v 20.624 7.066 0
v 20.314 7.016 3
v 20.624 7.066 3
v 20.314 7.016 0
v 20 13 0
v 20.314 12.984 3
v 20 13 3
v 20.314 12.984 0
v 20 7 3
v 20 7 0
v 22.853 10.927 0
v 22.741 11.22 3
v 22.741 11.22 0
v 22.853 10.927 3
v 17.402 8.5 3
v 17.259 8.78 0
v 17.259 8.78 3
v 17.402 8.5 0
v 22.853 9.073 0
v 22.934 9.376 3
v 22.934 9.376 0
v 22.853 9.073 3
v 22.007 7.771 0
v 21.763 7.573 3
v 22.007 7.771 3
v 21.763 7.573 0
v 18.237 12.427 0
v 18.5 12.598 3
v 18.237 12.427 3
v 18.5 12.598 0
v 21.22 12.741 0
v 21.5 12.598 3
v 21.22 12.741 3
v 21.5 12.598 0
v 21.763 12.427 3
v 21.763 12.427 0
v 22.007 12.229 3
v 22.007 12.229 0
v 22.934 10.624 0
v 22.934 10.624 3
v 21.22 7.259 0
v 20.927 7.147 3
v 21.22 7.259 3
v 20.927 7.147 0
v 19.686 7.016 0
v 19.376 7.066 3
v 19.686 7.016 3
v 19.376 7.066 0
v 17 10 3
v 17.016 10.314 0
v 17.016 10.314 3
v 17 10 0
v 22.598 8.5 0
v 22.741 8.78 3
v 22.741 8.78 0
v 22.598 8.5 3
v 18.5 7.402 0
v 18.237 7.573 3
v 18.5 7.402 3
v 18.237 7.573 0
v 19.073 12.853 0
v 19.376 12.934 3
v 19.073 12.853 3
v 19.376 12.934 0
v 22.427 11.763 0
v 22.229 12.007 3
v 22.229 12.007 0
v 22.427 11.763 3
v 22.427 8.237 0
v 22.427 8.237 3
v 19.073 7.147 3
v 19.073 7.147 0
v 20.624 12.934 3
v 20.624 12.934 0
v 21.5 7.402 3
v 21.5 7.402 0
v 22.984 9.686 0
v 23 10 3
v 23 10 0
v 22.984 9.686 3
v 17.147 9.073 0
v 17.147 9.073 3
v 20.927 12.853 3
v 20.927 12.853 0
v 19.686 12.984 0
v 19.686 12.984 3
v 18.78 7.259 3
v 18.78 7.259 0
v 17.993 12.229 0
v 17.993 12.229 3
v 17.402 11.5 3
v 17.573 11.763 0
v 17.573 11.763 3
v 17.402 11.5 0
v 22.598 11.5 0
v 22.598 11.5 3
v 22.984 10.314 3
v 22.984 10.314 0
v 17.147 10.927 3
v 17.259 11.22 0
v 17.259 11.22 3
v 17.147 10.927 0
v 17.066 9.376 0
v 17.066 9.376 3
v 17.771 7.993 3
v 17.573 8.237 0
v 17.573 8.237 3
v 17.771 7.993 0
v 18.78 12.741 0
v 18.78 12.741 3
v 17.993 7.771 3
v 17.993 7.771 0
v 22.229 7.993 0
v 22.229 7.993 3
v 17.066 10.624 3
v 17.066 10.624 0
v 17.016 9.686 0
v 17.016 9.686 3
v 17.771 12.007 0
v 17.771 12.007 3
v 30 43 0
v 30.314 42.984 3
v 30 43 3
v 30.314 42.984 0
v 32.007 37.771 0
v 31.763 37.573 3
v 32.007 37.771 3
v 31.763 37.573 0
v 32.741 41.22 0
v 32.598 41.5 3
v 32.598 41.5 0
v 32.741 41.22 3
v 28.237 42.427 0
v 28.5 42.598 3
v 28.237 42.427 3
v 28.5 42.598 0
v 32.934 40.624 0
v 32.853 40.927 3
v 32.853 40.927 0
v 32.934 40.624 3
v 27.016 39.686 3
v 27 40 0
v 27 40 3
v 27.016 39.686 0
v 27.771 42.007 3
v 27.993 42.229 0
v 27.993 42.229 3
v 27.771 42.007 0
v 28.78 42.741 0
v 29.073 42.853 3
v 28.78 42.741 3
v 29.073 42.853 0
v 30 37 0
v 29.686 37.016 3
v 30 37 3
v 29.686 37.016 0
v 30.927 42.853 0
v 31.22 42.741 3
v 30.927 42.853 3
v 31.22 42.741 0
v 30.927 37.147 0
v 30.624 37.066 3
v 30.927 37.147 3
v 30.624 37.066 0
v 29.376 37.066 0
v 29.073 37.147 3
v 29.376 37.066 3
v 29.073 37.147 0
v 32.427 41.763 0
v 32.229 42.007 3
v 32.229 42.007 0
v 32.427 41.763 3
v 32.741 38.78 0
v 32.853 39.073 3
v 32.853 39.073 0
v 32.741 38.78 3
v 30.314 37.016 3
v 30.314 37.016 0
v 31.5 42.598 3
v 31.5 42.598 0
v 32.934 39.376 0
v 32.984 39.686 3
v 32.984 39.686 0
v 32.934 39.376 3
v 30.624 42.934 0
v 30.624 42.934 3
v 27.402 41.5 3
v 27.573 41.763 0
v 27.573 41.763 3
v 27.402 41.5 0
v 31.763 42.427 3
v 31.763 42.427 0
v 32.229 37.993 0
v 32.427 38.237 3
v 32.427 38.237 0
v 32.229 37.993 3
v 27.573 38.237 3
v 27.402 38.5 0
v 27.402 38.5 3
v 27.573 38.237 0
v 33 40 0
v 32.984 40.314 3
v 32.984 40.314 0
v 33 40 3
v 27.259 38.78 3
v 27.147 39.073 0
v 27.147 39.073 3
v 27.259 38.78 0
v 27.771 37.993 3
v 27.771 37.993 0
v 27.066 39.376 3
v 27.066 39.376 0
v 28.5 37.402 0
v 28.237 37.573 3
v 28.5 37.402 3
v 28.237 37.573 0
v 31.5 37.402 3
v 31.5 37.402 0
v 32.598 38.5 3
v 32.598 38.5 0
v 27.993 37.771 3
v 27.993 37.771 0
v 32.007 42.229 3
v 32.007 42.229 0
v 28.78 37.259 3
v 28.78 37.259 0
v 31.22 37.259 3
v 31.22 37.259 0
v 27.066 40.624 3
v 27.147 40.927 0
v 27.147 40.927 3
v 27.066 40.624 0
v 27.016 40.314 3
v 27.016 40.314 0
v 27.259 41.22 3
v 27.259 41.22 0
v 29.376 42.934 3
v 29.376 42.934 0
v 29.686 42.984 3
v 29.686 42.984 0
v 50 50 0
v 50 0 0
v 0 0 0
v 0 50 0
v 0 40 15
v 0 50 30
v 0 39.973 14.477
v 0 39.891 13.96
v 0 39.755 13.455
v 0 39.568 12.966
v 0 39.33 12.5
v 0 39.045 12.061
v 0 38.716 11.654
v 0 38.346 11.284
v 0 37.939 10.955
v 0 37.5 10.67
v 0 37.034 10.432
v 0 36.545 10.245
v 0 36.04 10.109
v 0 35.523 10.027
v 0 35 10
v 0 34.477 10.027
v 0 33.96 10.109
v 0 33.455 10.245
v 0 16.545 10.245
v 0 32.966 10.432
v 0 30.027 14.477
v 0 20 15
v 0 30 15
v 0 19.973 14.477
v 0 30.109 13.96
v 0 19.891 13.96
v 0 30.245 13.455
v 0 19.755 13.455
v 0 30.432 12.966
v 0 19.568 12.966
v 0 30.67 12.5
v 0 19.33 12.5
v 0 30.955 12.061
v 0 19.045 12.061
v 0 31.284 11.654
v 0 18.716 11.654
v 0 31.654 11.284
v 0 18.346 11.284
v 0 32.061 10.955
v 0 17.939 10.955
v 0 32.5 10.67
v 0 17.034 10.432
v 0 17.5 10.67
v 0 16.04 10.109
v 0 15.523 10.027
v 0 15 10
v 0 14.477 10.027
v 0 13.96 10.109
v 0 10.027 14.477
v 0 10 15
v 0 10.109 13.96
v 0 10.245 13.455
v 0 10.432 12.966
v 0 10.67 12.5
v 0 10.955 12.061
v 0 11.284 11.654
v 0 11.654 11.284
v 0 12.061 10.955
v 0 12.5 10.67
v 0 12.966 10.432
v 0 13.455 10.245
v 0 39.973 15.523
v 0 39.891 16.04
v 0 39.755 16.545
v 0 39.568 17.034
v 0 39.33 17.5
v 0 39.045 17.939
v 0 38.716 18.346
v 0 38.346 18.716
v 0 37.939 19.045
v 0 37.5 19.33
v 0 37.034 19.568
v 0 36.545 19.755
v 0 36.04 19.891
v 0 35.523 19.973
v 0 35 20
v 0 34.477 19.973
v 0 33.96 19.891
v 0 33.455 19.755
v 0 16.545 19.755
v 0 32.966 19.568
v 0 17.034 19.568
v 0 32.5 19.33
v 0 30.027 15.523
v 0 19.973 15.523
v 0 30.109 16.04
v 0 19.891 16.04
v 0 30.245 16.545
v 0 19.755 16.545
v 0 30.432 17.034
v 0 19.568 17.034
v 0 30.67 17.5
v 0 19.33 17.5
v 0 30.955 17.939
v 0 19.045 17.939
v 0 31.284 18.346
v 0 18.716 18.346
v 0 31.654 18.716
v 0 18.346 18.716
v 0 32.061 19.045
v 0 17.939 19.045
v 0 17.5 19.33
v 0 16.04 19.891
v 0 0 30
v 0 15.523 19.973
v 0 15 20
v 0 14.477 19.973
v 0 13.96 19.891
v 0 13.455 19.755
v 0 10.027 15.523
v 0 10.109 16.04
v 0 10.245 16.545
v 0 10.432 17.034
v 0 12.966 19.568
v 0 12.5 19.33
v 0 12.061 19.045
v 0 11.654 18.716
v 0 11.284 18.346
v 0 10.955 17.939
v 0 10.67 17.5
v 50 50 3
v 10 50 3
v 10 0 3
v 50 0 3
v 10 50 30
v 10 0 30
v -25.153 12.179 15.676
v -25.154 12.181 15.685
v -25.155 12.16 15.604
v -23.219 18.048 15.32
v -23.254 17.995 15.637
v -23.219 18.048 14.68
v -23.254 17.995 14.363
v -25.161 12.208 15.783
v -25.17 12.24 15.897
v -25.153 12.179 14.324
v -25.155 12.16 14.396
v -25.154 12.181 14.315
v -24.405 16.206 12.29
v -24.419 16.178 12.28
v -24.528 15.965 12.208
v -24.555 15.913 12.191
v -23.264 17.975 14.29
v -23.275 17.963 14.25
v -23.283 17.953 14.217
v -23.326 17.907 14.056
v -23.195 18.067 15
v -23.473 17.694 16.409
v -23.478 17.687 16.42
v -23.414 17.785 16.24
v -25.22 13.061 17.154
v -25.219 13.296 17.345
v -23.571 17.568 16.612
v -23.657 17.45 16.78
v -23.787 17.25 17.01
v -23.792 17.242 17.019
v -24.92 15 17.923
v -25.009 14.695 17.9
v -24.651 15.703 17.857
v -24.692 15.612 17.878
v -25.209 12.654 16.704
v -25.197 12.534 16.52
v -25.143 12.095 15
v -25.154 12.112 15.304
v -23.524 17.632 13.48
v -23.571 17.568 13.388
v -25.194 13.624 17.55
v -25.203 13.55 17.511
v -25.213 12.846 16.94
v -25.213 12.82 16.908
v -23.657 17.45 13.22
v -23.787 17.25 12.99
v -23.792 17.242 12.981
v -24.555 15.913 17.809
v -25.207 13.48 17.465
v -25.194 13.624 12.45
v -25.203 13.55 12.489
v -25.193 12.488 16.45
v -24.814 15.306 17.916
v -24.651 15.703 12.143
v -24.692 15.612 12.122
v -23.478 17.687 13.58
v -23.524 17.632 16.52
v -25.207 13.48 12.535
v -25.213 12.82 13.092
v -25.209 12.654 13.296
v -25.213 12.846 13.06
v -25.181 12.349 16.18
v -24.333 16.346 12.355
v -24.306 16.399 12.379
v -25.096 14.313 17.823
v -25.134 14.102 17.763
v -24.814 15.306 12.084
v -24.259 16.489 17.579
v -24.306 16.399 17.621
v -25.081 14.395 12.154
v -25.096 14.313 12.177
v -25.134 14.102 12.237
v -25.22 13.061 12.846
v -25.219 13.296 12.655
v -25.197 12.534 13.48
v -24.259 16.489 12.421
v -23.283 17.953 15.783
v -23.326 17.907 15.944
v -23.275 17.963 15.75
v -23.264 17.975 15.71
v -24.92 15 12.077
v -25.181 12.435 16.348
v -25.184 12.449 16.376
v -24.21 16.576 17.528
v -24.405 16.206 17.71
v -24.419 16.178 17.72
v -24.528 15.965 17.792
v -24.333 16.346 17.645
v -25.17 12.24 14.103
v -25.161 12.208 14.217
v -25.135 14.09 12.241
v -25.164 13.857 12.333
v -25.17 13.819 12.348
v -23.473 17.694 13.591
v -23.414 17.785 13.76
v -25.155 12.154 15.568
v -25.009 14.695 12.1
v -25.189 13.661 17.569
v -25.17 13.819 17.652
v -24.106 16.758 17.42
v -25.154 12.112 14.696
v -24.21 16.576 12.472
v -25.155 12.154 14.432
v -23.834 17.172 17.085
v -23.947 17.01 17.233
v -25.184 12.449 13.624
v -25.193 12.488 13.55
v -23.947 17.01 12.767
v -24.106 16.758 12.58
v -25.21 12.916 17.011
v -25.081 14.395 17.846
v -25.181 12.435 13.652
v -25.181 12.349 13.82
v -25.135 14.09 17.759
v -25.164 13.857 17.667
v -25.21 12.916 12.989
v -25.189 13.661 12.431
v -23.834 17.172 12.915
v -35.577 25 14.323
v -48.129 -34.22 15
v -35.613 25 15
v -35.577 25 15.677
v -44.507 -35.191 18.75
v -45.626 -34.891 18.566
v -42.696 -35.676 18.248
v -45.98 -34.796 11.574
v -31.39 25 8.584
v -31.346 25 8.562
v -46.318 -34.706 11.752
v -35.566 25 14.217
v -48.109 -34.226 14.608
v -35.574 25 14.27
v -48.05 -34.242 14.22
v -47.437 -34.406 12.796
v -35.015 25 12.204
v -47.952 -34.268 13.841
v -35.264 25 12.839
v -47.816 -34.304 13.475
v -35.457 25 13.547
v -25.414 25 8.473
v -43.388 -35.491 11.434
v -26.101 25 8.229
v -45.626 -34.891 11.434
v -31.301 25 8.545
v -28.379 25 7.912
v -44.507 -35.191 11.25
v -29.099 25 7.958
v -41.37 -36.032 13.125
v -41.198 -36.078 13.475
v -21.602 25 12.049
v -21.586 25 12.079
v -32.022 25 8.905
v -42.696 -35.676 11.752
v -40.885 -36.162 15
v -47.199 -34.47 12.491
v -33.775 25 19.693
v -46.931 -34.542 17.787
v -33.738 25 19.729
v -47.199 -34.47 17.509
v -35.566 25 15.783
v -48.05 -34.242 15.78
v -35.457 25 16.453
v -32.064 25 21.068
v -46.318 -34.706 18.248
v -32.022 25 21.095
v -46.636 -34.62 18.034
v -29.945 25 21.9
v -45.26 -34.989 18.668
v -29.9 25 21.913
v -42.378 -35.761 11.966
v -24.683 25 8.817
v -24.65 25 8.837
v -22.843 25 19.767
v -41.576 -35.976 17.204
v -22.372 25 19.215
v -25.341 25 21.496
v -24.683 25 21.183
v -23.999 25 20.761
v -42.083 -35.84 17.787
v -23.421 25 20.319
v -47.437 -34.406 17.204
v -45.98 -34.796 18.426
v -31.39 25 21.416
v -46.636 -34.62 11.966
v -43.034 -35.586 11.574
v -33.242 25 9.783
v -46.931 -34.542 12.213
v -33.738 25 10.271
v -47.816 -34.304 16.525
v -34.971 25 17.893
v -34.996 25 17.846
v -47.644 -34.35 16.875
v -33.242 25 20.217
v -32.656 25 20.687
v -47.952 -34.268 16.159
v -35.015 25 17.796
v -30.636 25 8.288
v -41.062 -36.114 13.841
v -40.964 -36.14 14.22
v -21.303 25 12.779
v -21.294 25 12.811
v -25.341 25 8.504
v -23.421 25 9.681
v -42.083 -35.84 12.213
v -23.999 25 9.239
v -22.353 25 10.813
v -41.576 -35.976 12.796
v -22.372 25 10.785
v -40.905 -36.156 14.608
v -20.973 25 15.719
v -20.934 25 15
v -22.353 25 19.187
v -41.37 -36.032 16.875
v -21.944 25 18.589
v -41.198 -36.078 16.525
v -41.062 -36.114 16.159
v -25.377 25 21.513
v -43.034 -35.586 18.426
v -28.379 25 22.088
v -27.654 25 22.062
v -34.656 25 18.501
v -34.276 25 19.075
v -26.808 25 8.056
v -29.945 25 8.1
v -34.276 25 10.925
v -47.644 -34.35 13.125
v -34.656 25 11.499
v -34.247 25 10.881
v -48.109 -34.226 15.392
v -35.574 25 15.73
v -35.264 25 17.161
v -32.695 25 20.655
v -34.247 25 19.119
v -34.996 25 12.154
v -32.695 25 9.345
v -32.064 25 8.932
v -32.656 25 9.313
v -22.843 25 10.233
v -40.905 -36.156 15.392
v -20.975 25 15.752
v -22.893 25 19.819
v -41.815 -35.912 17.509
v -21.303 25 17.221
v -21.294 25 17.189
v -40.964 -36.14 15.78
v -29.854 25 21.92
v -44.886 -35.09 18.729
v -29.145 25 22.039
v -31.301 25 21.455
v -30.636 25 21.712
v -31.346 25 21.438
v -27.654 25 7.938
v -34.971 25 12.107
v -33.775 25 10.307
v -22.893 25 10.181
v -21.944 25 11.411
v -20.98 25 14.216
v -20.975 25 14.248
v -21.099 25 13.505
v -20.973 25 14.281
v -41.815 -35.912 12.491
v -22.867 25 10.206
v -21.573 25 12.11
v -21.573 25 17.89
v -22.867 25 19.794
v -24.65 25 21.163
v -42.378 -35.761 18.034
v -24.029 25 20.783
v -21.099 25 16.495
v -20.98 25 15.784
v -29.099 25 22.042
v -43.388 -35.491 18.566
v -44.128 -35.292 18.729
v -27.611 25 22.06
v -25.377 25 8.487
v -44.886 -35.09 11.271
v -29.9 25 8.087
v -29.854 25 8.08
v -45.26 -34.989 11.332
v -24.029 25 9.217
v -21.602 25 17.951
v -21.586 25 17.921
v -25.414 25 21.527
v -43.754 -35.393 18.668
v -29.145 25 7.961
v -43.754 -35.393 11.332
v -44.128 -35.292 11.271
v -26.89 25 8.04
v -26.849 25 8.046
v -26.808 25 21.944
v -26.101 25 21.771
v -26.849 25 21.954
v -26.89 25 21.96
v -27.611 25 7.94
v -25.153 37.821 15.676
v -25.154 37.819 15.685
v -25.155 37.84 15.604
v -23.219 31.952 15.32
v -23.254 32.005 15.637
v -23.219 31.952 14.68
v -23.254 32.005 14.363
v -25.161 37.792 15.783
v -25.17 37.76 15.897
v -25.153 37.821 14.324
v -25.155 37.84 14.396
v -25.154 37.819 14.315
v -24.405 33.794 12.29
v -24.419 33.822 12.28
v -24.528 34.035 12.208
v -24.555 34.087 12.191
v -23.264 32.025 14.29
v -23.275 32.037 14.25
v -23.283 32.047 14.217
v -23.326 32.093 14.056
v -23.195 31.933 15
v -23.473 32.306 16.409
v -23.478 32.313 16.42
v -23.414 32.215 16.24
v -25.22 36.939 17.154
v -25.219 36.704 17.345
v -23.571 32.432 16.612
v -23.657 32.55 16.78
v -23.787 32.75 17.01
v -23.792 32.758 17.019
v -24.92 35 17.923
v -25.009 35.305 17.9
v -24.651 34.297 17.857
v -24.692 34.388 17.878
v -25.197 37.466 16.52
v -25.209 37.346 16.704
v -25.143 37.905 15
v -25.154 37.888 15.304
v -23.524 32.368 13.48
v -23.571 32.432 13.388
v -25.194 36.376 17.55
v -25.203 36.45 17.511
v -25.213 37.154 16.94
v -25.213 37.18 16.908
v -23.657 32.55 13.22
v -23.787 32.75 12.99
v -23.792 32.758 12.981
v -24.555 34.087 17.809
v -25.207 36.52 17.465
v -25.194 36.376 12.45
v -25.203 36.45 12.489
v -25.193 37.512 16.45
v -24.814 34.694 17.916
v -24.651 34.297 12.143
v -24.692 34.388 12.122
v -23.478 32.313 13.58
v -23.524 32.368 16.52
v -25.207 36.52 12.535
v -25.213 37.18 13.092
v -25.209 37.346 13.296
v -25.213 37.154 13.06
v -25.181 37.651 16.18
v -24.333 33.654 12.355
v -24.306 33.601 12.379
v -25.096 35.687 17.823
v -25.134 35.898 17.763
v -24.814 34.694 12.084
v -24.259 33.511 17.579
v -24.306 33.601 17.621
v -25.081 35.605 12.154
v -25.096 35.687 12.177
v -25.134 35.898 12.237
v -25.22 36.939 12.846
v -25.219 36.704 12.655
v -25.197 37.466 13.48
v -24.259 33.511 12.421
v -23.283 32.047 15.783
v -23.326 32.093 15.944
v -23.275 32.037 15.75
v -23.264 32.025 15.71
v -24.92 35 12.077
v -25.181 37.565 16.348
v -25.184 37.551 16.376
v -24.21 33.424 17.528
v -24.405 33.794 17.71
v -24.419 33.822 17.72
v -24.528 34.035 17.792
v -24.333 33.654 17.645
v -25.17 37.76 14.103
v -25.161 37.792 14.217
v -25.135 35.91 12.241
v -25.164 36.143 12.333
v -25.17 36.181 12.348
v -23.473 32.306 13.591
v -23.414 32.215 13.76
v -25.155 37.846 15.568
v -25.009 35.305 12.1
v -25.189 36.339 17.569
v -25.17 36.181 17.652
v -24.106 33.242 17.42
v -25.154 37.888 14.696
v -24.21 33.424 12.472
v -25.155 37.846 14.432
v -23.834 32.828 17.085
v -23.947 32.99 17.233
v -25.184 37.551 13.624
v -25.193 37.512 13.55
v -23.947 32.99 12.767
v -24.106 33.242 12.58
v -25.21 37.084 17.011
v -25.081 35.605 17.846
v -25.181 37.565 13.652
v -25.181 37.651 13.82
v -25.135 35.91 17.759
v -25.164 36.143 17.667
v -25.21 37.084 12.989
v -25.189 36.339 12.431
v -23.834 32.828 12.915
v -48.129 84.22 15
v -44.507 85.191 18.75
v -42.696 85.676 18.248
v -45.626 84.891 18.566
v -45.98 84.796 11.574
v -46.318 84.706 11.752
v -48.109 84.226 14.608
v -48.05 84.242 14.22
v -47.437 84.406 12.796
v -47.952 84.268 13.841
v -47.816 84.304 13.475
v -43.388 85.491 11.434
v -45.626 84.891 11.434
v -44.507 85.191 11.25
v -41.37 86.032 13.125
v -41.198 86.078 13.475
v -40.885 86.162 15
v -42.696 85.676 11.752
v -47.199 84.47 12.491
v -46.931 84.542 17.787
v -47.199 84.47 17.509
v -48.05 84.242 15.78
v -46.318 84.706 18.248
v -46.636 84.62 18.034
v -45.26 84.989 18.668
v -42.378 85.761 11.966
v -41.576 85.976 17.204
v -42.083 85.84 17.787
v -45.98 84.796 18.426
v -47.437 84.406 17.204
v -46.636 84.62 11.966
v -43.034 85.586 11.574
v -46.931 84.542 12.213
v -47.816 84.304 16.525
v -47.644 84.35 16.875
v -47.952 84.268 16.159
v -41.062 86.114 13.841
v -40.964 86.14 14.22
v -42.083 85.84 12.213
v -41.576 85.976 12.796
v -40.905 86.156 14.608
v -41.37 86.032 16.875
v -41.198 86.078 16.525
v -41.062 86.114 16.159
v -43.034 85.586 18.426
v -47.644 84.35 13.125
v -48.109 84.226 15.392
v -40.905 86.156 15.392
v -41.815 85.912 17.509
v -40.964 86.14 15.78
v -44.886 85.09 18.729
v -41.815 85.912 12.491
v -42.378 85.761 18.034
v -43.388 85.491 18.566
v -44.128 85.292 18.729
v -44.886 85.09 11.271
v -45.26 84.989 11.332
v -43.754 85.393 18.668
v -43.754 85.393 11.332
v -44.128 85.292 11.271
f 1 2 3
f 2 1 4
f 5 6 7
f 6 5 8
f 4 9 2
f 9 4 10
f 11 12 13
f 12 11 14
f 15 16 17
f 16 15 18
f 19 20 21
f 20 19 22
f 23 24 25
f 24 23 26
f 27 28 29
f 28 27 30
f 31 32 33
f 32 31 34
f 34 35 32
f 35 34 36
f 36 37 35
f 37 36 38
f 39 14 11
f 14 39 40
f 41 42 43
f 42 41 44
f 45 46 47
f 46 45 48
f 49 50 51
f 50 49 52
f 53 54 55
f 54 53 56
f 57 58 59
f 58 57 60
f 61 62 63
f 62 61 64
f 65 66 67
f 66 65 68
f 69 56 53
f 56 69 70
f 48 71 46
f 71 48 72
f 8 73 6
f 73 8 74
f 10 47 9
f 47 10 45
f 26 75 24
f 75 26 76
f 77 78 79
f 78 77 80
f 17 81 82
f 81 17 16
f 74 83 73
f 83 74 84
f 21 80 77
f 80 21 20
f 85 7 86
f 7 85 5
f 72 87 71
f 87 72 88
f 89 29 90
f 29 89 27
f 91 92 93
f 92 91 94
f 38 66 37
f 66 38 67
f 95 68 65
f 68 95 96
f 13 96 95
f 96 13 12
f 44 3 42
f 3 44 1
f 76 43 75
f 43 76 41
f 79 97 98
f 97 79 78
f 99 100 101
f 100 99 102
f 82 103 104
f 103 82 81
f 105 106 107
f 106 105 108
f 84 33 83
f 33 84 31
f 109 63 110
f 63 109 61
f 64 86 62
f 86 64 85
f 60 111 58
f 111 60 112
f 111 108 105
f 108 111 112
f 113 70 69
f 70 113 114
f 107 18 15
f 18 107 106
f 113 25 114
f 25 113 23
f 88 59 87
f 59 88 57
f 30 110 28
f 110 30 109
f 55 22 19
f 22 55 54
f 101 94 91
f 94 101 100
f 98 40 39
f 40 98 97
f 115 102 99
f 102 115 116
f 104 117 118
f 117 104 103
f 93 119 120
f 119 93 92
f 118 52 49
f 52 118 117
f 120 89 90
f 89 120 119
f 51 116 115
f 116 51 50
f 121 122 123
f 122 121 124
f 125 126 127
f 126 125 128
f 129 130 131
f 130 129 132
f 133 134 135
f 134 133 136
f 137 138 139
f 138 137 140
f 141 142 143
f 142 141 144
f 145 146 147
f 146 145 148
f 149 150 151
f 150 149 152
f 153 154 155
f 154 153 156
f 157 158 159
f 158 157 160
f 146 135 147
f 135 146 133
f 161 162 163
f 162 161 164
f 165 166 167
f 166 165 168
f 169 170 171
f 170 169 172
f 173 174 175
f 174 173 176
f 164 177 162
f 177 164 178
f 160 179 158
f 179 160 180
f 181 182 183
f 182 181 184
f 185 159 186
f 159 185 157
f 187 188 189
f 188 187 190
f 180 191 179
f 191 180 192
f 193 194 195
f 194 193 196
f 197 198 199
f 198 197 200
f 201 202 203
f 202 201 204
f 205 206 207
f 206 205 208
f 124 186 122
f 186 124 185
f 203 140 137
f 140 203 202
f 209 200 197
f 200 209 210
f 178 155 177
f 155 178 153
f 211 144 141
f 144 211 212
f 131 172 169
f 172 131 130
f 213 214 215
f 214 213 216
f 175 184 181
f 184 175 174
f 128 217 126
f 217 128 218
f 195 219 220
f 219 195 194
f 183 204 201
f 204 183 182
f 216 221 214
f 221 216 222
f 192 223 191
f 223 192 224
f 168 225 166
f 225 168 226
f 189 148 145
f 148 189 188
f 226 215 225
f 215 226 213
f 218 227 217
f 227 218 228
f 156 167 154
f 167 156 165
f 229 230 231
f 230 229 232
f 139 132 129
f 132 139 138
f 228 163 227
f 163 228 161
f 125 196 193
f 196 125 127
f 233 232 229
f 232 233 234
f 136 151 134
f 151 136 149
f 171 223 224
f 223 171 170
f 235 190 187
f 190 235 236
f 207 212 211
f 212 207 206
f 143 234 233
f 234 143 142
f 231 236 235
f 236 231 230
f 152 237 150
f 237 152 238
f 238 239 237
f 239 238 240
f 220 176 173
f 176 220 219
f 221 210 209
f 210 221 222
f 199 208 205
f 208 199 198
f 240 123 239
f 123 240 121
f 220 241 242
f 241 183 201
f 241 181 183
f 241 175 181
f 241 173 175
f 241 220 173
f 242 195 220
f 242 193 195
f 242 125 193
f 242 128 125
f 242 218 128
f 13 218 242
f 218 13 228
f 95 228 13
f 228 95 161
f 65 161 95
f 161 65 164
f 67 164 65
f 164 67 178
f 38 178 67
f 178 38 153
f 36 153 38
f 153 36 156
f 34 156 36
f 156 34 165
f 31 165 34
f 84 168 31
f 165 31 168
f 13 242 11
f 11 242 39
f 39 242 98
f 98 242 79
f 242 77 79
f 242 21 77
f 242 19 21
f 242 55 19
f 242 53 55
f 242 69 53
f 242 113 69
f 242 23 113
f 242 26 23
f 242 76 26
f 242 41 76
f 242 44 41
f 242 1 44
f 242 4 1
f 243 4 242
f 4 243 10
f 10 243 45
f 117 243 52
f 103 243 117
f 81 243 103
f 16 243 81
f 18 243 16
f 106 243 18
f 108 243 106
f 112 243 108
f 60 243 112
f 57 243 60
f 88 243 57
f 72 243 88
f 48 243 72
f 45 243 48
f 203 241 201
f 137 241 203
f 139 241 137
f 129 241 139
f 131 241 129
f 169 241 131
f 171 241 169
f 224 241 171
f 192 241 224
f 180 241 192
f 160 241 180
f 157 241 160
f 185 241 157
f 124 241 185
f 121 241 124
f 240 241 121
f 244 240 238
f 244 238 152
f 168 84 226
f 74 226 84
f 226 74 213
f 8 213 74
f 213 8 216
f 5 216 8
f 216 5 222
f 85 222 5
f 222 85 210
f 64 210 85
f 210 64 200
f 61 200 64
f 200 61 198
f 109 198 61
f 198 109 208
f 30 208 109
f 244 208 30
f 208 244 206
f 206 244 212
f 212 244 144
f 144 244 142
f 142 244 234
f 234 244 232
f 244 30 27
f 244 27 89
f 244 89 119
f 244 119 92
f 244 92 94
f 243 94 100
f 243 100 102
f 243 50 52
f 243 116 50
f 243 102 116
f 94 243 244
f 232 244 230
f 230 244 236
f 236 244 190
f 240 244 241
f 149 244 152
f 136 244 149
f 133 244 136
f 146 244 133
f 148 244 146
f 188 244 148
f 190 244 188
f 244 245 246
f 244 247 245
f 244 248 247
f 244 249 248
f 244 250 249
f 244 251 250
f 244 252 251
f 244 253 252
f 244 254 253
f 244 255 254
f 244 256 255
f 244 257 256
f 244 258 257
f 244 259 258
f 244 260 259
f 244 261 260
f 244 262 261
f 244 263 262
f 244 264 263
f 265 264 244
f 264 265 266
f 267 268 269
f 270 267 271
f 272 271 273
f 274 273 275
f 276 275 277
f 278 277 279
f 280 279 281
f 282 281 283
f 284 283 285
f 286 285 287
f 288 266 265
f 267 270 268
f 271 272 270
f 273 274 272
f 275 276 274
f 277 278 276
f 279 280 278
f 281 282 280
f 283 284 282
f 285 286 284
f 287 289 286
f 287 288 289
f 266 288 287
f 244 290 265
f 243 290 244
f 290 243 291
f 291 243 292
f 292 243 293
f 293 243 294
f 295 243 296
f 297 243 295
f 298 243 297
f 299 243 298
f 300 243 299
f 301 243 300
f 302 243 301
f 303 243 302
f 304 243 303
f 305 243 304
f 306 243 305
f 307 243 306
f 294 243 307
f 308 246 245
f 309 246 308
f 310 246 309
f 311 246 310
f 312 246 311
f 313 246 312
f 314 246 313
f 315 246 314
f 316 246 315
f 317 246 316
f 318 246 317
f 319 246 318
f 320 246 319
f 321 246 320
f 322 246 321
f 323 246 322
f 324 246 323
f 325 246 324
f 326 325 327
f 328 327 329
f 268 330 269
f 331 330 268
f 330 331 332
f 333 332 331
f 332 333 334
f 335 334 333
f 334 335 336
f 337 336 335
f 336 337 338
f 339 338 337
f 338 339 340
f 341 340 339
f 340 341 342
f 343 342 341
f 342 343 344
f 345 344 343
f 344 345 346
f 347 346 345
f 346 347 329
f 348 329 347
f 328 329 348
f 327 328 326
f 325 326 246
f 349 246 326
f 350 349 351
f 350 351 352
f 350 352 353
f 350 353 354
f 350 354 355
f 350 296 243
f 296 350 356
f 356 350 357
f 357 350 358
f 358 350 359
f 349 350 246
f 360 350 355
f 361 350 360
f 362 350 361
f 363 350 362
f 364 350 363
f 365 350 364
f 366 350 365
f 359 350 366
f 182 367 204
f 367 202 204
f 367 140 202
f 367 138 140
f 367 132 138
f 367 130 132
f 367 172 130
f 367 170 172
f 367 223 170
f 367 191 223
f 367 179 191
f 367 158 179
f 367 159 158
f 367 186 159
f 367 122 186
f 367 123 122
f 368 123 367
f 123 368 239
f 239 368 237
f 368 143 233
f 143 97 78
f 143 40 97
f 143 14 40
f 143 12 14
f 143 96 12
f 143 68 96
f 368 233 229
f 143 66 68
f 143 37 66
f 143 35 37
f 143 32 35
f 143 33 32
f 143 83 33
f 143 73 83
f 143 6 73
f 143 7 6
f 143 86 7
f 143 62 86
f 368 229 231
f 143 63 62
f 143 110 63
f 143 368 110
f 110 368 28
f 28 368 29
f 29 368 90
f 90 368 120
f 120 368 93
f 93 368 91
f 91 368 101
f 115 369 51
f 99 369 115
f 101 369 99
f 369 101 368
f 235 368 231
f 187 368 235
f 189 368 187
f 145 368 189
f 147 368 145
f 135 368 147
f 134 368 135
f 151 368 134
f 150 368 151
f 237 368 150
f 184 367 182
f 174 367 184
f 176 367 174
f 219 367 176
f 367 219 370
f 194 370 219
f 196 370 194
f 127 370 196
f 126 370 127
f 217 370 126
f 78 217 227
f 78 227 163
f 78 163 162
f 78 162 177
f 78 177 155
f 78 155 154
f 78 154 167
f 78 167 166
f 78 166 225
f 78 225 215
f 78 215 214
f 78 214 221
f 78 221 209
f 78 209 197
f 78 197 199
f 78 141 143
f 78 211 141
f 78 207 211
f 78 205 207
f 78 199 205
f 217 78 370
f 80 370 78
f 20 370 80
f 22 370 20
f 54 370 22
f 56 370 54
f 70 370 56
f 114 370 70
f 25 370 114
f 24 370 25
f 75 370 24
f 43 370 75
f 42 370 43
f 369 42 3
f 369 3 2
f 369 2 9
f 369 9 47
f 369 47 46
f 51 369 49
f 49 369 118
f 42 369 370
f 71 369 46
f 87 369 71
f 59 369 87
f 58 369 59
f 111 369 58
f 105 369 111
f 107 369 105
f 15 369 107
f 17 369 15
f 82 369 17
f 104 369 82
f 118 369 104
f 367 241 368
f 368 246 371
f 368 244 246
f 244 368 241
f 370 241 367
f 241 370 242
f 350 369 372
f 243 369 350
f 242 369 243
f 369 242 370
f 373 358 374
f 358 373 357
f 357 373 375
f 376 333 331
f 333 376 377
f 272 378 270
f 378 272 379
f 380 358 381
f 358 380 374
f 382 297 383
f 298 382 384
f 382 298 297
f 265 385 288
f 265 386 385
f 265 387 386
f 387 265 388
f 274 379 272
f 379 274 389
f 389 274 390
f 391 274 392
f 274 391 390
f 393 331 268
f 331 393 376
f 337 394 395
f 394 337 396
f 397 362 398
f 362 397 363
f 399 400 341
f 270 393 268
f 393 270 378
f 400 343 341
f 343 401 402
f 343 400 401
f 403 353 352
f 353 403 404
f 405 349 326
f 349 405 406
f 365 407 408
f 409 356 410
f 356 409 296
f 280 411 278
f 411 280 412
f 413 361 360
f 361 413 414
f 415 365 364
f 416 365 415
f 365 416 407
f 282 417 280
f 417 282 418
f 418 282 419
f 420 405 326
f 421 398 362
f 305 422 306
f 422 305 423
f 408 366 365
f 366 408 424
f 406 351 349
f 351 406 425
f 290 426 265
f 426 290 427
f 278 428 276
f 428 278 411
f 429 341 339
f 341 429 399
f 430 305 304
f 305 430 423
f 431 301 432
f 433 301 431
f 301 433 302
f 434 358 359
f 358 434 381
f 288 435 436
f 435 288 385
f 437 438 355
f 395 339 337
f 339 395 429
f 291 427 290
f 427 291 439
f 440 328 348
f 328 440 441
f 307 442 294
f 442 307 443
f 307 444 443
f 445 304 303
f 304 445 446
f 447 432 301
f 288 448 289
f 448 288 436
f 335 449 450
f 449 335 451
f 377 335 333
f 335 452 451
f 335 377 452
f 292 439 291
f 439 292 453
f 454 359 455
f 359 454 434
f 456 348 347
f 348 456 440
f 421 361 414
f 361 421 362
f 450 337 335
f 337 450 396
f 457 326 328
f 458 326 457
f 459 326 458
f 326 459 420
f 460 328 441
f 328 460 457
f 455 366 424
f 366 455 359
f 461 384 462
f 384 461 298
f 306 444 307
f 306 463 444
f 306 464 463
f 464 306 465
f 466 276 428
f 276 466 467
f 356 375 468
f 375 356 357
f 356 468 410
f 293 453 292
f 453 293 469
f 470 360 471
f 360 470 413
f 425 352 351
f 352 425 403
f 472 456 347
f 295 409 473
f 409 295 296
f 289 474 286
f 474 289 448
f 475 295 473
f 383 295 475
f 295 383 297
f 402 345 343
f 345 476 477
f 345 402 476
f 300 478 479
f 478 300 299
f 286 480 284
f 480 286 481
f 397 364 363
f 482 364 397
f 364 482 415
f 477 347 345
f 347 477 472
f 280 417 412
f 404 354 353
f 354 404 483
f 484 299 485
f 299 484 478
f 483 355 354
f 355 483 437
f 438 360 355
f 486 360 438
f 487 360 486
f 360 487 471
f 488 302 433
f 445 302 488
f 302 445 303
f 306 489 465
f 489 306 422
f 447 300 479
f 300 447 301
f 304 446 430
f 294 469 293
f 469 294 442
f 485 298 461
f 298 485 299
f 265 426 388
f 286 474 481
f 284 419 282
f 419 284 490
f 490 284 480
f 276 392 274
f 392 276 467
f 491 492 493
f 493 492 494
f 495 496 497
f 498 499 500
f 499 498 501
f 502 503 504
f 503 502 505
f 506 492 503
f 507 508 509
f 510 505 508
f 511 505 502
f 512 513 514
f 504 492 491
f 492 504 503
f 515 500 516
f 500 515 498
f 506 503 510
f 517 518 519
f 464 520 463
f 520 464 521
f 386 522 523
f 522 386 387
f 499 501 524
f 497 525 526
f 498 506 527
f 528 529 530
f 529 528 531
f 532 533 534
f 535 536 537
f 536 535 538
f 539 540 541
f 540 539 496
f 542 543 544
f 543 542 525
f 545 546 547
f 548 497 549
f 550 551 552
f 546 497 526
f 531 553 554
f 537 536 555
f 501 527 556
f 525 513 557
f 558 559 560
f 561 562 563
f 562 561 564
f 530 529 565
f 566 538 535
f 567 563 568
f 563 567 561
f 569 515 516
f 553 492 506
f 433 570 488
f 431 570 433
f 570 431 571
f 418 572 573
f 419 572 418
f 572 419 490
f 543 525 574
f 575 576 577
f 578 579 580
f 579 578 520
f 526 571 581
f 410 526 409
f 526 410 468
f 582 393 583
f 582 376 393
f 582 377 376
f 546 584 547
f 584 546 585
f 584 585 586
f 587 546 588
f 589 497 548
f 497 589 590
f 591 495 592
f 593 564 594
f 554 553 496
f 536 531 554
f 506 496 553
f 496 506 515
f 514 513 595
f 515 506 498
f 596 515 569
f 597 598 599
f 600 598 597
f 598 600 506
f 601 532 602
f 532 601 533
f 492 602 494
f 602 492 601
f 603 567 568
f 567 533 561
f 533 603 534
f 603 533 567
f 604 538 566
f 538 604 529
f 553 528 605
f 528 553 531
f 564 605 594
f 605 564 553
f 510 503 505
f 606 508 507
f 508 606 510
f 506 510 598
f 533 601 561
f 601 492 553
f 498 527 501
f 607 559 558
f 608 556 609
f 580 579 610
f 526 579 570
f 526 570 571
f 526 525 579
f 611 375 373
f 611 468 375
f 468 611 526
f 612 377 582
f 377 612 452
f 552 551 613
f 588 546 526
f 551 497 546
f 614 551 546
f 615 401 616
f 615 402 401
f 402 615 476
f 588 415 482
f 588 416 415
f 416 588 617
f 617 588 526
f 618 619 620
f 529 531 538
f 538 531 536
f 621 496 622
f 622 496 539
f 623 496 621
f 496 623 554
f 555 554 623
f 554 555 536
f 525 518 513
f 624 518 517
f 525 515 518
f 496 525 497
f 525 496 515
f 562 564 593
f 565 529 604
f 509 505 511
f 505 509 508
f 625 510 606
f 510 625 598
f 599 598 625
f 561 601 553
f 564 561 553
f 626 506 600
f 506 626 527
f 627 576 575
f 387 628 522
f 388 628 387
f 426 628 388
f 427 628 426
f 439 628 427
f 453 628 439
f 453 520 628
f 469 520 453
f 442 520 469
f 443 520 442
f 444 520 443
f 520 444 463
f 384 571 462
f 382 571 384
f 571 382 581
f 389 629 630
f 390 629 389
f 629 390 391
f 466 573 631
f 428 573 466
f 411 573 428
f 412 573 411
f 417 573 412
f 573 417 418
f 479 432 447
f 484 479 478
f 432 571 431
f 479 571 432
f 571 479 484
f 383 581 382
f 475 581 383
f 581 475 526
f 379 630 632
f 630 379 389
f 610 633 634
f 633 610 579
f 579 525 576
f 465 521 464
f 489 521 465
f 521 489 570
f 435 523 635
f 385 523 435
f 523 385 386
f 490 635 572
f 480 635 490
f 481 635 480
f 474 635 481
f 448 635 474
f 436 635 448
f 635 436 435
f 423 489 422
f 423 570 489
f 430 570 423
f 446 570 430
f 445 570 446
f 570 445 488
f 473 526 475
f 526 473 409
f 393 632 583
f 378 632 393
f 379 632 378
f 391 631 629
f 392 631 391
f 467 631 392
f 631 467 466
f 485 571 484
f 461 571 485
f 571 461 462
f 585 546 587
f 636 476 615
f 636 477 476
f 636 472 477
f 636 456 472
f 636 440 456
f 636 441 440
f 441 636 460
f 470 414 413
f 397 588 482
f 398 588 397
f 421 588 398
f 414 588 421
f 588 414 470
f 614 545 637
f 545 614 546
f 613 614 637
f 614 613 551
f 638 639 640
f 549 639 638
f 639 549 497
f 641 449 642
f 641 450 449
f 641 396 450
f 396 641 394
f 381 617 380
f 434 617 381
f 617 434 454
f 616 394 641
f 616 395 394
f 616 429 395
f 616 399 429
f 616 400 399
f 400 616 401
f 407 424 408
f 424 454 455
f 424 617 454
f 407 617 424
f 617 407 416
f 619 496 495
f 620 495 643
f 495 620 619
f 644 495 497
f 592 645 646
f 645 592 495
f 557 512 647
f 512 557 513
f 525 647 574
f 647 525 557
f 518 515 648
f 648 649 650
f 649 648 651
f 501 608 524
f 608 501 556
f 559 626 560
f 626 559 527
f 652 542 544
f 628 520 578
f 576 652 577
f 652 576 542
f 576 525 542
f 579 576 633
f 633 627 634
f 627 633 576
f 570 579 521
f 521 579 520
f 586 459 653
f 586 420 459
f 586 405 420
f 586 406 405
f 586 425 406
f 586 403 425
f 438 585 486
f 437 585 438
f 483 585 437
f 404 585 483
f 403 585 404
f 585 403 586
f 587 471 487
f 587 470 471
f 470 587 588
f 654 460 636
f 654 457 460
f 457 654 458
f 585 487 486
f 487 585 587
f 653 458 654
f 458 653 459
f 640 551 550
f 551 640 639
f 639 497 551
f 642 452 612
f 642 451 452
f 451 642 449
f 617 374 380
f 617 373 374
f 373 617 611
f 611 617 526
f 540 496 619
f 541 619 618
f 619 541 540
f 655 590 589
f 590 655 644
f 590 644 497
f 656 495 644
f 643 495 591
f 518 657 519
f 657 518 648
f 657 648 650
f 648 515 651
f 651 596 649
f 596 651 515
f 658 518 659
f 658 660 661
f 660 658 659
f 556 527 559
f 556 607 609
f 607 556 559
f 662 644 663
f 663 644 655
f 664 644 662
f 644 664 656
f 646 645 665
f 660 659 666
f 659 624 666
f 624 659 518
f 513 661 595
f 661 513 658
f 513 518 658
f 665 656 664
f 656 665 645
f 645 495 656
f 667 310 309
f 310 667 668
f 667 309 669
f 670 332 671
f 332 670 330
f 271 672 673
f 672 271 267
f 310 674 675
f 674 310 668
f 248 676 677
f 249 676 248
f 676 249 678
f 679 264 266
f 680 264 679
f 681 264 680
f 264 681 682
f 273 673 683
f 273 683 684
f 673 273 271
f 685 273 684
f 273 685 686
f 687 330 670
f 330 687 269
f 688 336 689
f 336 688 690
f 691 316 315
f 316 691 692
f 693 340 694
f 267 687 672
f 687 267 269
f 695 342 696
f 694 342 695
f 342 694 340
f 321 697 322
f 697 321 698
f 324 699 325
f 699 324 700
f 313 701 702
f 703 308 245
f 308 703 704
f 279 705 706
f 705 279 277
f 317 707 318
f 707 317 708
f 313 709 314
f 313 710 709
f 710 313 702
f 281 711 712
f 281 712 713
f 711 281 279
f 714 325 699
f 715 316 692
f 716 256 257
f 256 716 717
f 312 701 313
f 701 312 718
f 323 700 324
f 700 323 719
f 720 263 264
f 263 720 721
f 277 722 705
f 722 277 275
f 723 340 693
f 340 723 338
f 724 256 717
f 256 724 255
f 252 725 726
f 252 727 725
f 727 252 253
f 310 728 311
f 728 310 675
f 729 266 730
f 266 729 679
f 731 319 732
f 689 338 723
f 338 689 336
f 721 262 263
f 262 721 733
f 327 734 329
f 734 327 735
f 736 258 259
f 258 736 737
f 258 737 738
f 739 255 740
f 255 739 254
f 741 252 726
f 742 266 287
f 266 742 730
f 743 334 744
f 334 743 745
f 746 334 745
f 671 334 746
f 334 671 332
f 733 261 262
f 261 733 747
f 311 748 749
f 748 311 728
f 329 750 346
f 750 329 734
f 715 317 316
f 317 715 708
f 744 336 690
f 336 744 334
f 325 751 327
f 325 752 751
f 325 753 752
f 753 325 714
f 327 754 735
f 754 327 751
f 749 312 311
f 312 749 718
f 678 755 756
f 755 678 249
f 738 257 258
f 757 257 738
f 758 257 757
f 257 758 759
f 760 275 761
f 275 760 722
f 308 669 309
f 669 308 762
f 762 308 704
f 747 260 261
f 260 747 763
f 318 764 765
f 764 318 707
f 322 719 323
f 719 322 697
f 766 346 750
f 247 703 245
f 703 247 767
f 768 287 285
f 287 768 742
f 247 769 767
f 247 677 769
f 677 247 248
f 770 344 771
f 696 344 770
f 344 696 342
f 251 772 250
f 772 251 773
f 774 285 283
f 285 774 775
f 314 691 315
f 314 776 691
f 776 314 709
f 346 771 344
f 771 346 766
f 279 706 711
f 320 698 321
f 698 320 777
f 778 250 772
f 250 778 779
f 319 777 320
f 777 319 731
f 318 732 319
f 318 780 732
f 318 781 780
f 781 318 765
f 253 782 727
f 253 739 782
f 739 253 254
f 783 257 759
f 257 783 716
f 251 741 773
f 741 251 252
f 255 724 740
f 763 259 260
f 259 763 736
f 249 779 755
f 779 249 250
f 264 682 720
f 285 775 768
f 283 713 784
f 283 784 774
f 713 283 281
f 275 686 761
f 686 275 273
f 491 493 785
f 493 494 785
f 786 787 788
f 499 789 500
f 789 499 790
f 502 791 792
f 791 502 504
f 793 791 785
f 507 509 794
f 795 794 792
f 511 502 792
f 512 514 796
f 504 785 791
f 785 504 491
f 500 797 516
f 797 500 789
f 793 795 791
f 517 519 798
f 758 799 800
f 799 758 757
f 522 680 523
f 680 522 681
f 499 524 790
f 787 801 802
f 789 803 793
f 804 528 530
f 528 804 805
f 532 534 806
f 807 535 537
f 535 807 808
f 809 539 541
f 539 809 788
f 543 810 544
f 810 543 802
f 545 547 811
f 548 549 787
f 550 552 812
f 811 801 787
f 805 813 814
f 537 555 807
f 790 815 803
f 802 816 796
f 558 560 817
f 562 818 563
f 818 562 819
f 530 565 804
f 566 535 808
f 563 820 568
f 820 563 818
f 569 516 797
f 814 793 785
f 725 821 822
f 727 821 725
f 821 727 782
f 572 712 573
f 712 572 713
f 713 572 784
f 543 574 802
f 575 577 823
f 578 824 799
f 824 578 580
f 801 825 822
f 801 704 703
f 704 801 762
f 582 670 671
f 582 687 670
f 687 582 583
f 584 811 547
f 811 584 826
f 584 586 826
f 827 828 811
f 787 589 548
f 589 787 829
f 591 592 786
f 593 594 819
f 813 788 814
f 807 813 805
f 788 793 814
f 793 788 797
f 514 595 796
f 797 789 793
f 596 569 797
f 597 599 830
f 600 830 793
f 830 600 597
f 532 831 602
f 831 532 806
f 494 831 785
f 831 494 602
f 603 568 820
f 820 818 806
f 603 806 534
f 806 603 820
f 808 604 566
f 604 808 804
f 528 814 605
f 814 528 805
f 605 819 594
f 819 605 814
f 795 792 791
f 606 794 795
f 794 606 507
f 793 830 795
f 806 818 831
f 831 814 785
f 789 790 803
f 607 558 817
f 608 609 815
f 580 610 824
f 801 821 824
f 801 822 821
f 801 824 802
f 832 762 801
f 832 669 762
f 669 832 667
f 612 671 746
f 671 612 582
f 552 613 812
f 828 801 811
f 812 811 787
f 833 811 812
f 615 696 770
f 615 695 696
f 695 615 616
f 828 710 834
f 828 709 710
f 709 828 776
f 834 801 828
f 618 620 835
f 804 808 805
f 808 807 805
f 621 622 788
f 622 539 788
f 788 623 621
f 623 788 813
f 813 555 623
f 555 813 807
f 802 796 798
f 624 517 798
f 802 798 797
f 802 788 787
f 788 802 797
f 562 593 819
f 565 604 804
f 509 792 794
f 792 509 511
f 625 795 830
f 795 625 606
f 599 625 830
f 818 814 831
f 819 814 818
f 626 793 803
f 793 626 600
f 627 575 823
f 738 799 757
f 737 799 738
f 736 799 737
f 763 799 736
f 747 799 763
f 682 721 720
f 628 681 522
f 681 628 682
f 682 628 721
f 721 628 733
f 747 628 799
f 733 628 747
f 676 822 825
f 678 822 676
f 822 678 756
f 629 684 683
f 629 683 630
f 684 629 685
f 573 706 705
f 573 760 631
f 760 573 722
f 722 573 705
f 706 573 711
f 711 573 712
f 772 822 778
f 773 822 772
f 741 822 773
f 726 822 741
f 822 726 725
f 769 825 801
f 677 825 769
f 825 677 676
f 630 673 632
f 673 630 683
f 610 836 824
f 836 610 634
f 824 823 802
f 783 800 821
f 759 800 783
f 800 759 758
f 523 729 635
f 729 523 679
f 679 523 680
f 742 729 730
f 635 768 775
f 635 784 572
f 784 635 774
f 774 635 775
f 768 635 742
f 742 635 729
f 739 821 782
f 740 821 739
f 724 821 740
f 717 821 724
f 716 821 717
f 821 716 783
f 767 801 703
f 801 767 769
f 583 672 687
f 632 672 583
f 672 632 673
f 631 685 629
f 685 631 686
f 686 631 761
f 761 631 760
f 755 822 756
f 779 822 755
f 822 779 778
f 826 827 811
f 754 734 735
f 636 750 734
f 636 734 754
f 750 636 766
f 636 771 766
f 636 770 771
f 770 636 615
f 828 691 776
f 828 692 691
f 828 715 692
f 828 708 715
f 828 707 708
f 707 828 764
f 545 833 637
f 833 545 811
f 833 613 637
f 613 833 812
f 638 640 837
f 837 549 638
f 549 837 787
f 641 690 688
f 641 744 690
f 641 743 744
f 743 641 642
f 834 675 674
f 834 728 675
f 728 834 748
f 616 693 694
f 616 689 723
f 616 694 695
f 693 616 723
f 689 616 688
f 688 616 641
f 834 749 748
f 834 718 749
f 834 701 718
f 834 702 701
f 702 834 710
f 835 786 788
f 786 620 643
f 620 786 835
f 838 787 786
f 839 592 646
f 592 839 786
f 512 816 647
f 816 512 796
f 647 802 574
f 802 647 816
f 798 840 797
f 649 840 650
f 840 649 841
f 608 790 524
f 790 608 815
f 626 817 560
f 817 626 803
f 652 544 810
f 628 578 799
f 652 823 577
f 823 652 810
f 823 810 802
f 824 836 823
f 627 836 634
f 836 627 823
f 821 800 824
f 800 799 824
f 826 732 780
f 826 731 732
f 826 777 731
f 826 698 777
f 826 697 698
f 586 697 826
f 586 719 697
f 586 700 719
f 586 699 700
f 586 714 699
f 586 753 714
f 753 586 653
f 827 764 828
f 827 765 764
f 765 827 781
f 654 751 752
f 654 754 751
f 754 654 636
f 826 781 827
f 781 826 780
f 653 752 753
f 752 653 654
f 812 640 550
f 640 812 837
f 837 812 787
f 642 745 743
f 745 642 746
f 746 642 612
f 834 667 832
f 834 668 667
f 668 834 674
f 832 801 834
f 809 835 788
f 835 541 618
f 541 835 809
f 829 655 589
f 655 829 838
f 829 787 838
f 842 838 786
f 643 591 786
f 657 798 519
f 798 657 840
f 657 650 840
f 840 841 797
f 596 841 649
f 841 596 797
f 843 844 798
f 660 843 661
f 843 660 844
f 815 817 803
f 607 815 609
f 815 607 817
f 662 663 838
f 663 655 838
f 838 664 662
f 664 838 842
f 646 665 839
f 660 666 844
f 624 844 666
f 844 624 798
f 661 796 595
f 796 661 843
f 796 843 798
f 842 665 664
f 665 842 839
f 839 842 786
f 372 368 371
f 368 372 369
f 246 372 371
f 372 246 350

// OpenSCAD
$fn=60;

module bracket_panel(width, length, thickness, screw_position) {


    difference() {
        linear_extrude(thickness) {
            square([width, length]);
        }

        if (screw_position != undef) {
            union() {
                translate([screw_position[0], screw_position[1],0])
                rotate([0,0,90]) {
                    linear_extrude(thickness * 5, center=true)
                    circle(3);
                }

                //mirrors the above
                translate([width - screw_position[0], length - screw_position[1],0])
                rotate([0,0,90]) {
                    linear_extrude(thickness * 5, center=true)
                    circle(3);
                }
            }
        }
    }
}

module half_handle() {
    rotate([-90,0,90])
    difference() {
        translate ([-10,0,0]) {
        
            translate([0,0,0])
            linear_extrude(30, scale=0.5) circle(5);

            rotate([0, -75, 0])
            translate([30,0,-10])
            linear_extrude(70, scale=0.5) circle(7.5);
        }

        translate([0,-15,0]) cube([30,30,60]);
    }
}

module handle() {
    half_handle();
    mirror([0,1,0]) half_handle();
}

thickness=3;
width=50;
length=50;

bracket_panel(width, length, thickness, [2/5 * width, 1/5 * length]);

translate([10,0,0])
rotate([0,-90,0]) {
    bracket_panel(30, length, 10);
}

offset=[0,25,15];
translate(offset) handle();
